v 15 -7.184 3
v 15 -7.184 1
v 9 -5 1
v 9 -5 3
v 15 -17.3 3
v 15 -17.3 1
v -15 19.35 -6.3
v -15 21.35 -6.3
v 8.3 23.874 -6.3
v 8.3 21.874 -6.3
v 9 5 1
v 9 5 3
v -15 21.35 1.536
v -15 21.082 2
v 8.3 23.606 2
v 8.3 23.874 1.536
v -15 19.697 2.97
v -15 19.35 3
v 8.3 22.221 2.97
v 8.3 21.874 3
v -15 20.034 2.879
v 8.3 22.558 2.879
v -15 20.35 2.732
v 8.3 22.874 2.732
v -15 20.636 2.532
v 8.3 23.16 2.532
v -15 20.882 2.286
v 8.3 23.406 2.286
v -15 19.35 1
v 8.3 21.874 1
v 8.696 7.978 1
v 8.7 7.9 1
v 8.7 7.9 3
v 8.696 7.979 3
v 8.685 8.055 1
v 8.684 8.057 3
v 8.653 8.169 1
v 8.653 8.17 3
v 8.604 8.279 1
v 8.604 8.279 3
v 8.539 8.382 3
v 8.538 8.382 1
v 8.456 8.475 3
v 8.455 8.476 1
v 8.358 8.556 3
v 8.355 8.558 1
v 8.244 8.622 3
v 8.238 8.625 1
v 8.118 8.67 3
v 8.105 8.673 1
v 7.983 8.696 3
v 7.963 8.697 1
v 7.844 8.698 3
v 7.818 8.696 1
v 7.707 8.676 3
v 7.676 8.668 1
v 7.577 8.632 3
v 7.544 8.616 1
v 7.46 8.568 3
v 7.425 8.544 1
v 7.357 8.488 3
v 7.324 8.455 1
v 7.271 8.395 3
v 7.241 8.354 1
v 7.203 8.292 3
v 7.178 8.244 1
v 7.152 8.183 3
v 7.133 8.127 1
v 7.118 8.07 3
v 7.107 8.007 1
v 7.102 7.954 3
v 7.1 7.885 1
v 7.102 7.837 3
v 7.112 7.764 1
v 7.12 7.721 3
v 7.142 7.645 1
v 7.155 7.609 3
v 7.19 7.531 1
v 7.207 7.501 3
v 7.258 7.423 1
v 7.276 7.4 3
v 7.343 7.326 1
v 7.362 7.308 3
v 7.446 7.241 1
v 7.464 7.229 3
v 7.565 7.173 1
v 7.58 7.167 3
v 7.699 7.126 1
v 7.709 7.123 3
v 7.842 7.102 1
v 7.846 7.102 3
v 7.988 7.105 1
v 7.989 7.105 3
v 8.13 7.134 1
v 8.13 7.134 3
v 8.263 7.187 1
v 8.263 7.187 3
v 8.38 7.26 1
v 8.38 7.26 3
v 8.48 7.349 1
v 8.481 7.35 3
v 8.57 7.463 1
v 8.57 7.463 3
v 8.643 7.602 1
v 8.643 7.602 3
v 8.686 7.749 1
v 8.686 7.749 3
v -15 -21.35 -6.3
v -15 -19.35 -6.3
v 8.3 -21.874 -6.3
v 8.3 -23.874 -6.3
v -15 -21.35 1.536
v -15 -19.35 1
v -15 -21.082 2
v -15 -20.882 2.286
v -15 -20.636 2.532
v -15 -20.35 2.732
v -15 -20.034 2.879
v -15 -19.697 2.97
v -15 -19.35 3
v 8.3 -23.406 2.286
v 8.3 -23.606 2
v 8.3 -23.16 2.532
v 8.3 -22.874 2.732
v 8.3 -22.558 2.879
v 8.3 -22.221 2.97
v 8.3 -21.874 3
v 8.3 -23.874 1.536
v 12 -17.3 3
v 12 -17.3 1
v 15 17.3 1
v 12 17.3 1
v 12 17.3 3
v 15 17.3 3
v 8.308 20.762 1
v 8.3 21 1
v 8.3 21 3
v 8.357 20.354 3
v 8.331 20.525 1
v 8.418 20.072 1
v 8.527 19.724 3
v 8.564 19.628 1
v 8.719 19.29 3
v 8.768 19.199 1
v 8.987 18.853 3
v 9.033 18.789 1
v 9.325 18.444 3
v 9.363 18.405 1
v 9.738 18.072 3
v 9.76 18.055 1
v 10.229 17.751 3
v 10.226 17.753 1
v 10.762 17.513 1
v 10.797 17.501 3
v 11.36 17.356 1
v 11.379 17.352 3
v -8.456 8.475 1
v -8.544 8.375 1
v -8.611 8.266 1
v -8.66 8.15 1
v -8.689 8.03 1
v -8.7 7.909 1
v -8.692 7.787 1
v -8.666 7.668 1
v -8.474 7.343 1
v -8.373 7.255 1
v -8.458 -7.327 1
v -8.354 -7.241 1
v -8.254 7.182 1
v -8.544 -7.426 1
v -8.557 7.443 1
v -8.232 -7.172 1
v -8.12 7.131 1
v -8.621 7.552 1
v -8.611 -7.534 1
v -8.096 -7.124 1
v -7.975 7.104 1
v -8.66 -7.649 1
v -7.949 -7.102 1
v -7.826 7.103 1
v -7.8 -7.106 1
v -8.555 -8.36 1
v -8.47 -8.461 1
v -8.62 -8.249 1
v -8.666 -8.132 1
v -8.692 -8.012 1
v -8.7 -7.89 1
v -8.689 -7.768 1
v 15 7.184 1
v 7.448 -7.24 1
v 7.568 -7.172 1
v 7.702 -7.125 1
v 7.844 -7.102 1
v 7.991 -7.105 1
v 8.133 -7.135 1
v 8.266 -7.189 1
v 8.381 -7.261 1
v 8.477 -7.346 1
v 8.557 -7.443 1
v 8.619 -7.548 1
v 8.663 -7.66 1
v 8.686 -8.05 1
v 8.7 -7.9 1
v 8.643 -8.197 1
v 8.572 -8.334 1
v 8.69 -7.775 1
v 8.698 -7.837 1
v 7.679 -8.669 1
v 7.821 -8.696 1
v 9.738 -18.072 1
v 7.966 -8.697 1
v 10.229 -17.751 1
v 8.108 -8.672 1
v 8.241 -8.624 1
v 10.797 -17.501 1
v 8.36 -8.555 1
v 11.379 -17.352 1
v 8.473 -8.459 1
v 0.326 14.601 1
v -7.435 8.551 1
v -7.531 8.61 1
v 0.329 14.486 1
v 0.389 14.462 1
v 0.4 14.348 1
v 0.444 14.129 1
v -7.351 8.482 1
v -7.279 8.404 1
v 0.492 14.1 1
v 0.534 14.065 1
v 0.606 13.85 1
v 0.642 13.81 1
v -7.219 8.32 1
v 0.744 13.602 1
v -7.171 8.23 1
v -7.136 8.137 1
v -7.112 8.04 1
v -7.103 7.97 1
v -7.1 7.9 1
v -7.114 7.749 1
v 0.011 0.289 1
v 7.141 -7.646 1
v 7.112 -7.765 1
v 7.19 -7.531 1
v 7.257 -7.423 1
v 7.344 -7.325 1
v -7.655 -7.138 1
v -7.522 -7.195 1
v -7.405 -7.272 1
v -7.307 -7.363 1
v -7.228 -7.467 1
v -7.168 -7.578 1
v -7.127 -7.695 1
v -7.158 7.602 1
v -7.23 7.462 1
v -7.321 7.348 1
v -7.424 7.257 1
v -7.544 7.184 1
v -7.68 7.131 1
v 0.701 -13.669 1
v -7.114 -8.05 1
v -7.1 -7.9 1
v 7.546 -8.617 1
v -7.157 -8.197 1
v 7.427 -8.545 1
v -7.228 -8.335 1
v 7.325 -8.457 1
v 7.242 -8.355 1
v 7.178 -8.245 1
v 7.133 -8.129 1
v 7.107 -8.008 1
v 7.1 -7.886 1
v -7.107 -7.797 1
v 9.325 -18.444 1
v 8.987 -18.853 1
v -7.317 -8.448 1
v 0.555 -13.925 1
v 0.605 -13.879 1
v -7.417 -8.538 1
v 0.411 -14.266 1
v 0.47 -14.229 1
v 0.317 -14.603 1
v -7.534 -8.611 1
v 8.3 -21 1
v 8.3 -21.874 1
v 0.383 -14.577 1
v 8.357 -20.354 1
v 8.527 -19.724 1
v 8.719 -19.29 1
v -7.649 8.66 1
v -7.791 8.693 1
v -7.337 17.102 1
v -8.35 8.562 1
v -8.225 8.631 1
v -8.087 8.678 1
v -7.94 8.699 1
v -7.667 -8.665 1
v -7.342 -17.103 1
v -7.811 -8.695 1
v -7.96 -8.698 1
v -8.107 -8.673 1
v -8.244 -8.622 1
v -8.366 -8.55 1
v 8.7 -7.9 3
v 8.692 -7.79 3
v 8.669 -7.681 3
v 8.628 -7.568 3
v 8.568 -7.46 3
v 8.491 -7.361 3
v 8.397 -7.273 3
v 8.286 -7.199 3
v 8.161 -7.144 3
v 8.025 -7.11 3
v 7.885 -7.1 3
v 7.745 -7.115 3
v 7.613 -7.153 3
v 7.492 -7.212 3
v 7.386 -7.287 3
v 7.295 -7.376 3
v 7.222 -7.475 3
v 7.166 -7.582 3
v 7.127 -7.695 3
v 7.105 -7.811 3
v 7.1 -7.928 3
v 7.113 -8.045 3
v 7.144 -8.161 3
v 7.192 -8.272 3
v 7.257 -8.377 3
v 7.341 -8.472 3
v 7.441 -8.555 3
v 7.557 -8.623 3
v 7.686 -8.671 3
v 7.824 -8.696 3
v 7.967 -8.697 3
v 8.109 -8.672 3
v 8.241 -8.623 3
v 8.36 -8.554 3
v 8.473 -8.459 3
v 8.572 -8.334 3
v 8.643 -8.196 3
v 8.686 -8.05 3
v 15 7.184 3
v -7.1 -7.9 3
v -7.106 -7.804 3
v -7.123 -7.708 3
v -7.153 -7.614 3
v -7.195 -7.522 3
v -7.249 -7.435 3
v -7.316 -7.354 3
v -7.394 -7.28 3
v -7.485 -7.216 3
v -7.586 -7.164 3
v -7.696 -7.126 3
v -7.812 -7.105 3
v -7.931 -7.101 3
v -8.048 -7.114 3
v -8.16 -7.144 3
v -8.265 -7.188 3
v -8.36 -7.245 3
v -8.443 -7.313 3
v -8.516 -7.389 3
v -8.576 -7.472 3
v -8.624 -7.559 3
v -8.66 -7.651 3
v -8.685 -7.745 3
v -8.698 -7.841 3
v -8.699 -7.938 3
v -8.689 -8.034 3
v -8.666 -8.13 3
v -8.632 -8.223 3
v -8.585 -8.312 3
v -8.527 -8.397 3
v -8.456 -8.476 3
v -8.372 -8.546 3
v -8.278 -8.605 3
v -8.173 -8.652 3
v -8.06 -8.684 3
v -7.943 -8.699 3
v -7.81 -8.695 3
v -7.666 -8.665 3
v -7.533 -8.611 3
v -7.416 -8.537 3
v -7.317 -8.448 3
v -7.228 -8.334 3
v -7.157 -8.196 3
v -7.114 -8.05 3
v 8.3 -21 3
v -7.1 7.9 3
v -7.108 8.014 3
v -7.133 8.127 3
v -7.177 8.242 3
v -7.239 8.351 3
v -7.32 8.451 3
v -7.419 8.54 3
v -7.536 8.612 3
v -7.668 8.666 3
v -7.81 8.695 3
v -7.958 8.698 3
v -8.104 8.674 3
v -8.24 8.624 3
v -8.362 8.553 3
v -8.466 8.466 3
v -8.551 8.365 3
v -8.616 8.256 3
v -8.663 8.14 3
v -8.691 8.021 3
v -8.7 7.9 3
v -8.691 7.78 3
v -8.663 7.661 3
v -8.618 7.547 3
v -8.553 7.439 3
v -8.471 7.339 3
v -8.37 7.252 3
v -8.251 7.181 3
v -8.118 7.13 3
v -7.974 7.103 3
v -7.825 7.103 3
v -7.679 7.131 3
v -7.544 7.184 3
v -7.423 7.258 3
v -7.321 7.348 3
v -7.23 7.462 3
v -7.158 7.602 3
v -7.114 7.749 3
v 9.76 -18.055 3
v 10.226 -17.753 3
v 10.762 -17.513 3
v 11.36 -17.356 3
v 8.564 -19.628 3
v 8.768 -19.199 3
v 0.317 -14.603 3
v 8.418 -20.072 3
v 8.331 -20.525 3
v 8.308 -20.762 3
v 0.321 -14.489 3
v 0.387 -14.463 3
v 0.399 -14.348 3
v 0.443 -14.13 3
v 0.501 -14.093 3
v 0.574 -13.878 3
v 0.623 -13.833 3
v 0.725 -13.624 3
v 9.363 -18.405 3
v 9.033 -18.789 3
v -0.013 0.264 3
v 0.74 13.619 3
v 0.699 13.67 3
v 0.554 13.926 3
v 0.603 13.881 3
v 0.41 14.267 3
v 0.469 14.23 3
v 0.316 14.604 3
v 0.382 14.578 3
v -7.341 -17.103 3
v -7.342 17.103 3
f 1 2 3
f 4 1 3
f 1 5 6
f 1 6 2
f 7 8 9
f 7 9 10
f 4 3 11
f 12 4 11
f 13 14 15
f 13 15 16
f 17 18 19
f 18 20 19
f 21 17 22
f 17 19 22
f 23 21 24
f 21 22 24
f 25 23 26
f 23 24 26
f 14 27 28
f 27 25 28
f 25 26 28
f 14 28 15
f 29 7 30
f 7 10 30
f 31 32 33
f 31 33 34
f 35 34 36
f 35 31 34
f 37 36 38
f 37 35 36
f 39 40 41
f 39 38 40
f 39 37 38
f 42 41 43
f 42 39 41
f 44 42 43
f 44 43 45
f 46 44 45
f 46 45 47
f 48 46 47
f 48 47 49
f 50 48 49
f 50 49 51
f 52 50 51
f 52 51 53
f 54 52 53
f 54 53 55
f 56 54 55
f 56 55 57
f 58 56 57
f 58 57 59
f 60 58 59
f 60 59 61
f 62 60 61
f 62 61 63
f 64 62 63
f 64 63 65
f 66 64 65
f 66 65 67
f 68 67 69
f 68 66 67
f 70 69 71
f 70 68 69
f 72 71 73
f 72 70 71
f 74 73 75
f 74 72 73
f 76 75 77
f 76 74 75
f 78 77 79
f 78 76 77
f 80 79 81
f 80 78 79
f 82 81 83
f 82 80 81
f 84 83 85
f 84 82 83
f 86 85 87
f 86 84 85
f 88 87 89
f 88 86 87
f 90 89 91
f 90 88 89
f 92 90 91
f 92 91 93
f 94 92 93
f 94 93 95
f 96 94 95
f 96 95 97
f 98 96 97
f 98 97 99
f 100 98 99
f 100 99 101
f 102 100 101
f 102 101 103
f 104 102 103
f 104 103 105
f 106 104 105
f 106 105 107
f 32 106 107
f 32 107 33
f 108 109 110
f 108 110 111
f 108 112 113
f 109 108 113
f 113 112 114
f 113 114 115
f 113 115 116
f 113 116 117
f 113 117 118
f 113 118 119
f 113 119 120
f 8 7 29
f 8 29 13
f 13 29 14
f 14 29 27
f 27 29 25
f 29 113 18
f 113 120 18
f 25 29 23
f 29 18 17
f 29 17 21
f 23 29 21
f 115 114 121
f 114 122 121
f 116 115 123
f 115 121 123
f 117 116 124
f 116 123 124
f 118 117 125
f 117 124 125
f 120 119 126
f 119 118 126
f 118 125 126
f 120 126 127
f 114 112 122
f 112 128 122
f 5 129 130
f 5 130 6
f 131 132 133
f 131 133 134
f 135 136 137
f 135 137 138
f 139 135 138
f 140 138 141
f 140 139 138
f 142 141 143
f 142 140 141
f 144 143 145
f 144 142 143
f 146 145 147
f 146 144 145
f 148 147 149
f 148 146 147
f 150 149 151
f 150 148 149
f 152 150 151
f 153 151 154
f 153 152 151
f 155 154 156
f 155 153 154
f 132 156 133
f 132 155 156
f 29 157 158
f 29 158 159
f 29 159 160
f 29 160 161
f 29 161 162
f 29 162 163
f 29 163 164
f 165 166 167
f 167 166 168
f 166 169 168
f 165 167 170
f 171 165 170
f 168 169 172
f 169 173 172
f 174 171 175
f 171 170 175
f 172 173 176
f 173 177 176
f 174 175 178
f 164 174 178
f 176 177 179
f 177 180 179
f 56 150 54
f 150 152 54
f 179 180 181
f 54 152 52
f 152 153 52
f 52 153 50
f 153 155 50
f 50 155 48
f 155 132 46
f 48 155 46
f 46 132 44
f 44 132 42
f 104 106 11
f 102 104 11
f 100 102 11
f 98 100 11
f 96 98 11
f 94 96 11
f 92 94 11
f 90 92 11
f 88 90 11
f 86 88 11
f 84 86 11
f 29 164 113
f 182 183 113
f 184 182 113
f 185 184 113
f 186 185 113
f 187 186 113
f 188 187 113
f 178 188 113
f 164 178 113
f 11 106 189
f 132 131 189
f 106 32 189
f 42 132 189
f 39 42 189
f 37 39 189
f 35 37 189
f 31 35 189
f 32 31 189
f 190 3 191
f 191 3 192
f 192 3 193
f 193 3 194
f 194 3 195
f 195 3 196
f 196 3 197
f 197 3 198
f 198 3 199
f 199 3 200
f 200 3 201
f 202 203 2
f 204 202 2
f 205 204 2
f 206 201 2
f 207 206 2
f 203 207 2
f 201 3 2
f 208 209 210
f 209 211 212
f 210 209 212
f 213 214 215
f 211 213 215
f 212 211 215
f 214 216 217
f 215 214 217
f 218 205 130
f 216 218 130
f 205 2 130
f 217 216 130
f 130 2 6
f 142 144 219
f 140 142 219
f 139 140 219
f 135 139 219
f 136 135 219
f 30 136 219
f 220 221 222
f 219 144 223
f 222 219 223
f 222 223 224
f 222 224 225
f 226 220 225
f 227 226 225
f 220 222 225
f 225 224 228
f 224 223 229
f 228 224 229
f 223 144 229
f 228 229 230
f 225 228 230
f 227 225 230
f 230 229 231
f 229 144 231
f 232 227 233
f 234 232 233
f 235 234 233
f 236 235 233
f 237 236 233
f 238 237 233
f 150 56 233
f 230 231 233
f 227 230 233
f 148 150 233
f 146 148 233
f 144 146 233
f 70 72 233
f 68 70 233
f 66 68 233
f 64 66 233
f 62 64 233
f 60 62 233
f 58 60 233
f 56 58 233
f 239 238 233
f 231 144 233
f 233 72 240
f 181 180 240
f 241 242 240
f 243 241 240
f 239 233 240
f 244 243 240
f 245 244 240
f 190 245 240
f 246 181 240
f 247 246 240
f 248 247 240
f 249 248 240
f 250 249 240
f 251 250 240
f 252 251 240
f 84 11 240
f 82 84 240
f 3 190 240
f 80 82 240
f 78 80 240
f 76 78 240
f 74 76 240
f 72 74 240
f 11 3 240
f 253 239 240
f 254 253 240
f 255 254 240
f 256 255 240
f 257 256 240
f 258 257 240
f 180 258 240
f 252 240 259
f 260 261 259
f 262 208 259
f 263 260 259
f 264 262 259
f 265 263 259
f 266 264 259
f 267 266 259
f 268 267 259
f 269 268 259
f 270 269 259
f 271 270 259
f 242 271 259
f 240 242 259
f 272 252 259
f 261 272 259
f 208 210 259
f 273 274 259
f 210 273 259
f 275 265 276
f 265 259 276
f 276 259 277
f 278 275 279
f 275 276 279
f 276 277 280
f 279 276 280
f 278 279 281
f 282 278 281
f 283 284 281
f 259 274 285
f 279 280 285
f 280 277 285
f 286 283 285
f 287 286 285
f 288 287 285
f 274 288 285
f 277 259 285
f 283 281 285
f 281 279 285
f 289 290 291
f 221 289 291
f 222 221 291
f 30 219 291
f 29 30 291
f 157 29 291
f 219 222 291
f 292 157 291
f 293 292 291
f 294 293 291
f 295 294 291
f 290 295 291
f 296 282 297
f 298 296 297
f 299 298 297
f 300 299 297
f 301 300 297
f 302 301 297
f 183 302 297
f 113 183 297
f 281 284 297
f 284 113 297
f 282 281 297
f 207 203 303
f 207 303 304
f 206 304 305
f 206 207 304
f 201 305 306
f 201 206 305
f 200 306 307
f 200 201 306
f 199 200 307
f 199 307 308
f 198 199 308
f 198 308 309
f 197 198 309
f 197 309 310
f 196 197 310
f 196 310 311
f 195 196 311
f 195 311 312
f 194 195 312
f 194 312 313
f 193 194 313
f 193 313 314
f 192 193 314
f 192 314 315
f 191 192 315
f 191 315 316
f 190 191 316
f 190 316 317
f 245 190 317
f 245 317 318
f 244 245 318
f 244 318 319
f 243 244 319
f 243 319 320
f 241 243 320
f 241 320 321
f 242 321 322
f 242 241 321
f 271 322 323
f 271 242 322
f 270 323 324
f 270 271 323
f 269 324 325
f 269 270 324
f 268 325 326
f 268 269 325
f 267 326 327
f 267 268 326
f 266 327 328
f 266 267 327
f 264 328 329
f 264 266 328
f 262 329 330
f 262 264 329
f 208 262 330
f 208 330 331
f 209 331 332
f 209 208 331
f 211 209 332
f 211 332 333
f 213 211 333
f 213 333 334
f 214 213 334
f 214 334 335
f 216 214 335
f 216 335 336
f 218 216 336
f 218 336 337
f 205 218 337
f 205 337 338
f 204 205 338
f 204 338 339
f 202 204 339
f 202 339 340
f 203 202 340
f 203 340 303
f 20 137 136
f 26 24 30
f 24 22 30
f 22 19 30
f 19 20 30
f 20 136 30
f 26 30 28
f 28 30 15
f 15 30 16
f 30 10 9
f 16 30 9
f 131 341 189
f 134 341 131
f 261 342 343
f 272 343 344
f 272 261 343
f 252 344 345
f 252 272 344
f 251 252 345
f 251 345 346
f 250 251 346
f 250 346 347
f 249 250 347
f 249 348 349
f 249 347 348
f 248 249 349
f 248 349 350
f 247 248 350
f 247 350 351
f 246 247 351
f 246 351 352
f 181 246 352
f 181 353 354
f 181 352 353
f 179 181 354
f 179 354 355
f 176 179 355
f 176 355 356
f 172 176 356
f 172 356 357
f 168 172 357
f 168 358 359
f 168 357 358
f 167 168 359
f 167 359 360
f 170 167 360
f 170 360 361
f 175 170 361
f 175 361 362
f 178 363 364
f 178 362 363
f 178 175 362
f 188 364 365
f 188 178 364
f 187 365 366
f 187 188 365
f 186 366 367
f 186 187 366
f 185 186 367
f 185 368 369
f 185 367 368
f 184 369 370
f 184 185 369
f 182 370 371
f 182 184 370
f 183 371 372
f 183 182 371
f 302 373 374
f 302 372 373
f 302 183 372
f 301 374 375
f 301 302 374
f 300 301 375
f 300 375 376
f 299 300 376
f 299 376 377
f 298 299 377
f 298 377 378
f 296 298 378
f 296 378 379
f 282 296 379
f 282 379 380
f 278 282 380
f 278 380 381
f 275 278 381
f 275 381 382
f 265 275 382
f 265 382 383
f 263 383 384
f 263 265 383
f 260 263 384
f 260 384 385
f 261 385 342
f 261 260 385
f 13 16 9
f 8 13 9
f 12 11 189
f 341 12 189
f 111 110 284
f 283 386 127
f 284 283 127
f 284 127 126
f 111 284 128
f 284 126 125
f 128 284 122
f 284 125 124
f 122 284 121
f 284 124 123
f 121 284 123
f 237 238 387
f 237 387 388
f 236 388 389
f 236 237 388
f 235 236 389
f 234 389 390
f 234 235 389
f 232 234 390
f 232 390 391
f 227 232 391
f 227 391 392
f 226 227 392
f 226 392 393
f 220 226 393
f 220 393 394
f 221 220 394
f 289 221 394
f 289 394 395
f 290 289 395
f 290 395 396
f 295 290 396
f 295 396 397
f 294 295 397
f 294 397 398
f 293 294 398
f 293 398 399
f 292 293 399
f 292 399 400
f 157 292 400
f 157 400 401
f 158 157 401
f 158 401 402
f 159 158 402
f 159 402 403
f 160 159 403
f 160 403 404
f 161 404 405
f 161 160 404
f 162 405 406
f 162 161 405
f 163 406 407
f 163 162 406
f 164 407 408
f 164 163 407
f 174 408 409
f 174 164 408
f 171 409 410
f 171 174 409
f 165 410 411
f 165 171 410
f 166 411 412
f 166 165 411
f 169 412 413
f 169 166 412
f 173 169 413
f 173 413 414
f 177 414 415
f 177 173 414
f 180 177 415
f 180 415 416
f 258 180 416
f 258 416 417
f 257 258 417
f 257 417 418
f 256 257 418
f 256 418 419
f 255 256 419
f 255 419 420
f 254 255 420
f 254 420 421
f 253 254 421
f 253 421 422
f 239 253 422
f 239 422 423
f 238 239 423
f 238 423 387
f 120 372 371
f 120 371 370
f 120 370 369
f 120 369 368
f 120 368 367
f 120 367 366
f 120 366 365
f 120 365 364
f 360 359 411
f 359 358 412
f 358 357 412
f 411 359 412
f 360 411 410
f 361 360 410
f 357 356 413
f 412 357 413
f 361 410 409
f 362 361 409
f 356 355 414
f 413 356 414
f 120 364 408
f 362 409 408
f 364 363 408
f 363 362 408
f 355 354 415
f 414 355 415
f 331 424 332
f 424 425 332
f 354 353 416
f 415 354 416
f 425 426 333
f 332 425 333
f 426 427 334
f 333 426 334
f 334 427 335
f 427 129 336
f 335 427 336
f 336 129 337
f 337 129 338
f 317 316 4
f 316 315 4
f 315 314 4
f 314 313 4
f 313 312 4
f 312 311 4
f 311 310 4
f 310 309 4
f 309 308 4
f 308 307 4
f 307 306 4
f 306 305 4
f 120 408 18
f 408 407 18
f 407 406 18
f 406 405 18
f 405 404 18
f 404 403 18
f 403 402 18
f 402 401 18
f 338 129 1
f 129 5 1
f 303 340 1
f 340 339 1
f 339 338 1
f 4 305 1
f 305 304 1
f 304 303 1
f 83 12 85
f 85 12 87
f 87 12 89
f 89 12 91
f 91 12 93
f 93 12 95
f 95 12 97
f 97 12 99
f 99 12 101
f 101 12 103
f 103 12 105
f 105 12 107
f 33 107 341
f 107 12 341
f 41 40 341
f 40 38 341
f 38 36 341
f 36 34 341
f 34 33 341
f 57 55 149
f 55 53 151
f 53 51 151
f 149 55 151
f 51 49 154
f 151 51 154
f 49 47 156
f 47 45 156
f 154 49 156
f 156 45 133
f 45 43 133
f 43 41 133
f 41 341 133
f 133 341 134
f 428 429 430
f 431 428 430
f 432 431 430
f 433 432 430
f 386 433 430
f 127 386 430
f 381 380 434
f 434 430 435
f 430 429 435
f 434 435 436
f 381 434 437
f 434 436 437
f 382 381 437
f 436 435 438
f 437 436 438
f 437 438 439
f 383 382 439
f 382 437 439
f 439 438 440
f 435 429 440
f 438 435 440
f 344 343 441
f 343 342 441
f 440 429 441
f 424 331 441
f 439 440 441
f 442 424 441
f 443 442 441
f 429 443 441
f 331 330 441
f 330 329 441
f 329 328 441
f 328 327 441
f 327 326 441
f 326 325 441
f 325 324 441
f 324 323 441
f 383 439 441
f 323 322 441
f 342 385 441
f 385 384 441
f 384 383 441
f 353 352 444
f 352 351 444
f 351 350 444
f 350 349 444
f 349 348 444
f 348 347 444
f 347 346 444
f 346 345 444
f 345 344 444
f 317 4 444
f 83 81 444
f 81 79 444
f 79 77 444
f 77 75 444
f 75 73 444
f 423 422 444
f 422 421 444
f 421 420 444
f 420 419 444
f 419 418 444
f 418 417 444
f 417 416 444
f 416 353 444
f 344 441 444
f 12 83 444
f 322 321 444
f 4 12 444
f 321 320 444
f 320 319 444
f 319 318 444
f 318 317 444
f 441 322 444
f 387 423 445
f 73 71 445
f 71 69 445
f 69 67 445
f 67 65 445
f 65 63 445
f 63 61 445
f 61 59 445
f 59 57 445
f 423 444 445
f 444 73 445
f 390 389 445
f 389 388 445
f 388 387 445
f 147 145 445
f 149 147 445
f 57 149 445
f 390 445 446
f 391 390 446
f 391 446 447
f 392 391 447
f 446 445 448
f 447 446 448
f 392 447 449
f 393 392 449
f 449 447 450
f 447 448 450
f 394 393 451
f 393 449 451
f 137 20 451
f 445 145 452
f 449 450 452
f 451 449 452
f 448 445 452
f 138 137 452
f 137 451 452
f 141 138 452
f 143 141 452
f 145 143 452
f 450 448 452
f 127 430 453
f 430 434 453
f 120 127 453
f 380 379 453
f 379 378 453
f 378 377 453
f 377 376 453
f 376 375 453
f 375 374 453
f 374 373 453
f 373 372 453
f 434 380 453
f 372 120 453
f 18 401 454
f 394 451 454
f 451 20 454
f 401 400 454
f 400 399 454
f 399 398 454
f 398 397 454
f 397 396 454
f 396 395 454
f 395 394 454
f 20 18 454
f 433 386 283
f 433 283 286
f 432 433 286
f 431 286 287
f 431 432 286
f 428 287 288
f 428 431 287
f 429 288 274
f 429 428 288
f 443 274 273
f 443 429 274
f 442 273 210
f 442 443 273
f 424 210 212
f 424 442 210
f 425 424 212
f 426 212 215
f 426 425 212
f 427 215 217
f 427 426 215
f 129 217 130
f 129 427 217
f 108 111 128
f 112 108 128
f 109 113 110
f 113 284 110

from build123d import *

# Parameters (mm, degrees)
SKETCH047_R          = 0.8
POCKET027_DEPTH      = 6.3010001
POCKET027_DEPTH_BACK = 3.0010001
POCKET028_DEPTH      = 6.3010001
POCKET028_DEPTH_BACK = 3.0010001
POCKET030_DEPTH      = 123.0422530554
POCKET030_DEPTH_BACK = 119.7422530554


with BuildPart() as part:
    # Sketch046 → AdditiveLoft section 0
    with BuildSketch(Plane.YZ.offset(-15)):
        with BuildLine():
            Line((-19.35, 3), (19.35, 3))
            ThreePointArc((21.0820508076, 2), (20.35, 2.7320508076), (19.35, 3))
            Line((21.0820508076, 2), (21.35, 1.5358983849))
            Line((21.35, 1.5358983849), (21.35, -6.3))
            Line((21.35, -6.3), (19.35, -6.3))
            Line((19.35, 1), (19.35, -6.3))
            Line((-19.35, 1), (19.35, 1))
            Line((-19.35, -6.3), (-19.35, 1))
            Line((-19.35, -6.3), (-21.35, -6.3))
            Line((-21.35, -6.3), (-21.35, 1.5358983849))
            Line((-21.0820508076, 2), (-21.35, 1.5358983849))
            ThreePointArc((-19.35, 3), (-20.35, 2.7320508076), (-21.0820508076, 2))
        make_face()
    # Sketch058 → AdditiveLoft section 1
    with BuildSketch(Plane.YZ.offset(15)):
        with BuildLine():
            Line((-22.6, 3), (22.6, 3))
            ThreePointArc((24.3320508076, 2), (23.6, 2.7320508076), (22.6, 3))
            Line((24.3320508076, 2), (24.6, 1.5358983849))
            Line((24.6, 1.5358983849), (24.6, -6.3))
            Line((24.6, -6.3), (22.6, -6.3))
            Line((22.6, 1), (22.6, -6.3))
            Line((-22.6, 1), (22.6, 1))
            Line((-22.6, -6.3), (-22.6, 1))
            Line((-22.6, -6.3), (-24.6, -6.3))
            Line((-24.6, -6.3), (-24.6, 1.5358983849))
            Line((-24.3320508076, 2), (-24.6, 1.5358983849))
            ThreePointArc((-22.6, 3), (-23.6, 2.7320508076), (-24.3320508076, 2))
        make_face()
    loft()

    # Sketch047 → Pocket027 (cut, two sides)
    with BuildSketch(Plane.XY) as pocket027_sk:
        with Locations((7.9, 7.9)):
            Circle(SKETCH047_R)
        with Locations((-7.9, 7.9)):
            Circle(SKETCH047_R)
        with Locations((-7.9, -7.9)):
            Circle(SKETCH047_R)
        with Locations((7.9, -7.9)):
            Circle(SKETCH047_R)
    extrude(amount=-POCKET027_DEPTH, mode=Mode.SUBTRACT)
    extrude(pocket027_sk.sketch, amount=POCKET027_DEPTH_BACK, mode=Mode.SUBTRACT)

    # Sketch048 → Pocket028 (cut, two sides)
    with BuildSketch(Plane.XY) as pocket028_sk:
        Polygon((9, 5), (16, 7.5477916399), (16, -7.5477916399), (9, -5), align=None)
    extrude(amount=-POCKET028_DEPTH, mode=Mode.SUBTRACT)
    extrude(pocket028_sk.sketch, amount=POCKET028_DEPTH_BACK, mode=Mode.SUBTRACT)

    # Sketch050 → Pocket030 (cut, two sides)
    with BuildSketch(Plane.XY) as pocket030_sk:
        with BuildLine():
            Line((8.3, 30), (18.3, 30))
            Line((18.3, 30), (18.3, 17.3))
            Line((12, 17.3), (18.3, 17.3))
            ThreePointArc((8.3, 21), (9.3837049096, 18.3837049096), (12, 17.3))
            Line((8.3, 21), (8.3, 30))
        make_face()
    pocket030 = extrude(amount=-POCKET030_DEPTH, mode=Mode.SUBTRACT) + extrude(pocket030_sk.sketch, amount=POCKET030_DEPTH_BACK, mode=Mode.SUBTRACT)

    # Mirrored011: Pocket030 across XZ
    add(pocket030.mirror(Plane.XZ), mode=Mode.SUBTRACT)


solid = part.part
